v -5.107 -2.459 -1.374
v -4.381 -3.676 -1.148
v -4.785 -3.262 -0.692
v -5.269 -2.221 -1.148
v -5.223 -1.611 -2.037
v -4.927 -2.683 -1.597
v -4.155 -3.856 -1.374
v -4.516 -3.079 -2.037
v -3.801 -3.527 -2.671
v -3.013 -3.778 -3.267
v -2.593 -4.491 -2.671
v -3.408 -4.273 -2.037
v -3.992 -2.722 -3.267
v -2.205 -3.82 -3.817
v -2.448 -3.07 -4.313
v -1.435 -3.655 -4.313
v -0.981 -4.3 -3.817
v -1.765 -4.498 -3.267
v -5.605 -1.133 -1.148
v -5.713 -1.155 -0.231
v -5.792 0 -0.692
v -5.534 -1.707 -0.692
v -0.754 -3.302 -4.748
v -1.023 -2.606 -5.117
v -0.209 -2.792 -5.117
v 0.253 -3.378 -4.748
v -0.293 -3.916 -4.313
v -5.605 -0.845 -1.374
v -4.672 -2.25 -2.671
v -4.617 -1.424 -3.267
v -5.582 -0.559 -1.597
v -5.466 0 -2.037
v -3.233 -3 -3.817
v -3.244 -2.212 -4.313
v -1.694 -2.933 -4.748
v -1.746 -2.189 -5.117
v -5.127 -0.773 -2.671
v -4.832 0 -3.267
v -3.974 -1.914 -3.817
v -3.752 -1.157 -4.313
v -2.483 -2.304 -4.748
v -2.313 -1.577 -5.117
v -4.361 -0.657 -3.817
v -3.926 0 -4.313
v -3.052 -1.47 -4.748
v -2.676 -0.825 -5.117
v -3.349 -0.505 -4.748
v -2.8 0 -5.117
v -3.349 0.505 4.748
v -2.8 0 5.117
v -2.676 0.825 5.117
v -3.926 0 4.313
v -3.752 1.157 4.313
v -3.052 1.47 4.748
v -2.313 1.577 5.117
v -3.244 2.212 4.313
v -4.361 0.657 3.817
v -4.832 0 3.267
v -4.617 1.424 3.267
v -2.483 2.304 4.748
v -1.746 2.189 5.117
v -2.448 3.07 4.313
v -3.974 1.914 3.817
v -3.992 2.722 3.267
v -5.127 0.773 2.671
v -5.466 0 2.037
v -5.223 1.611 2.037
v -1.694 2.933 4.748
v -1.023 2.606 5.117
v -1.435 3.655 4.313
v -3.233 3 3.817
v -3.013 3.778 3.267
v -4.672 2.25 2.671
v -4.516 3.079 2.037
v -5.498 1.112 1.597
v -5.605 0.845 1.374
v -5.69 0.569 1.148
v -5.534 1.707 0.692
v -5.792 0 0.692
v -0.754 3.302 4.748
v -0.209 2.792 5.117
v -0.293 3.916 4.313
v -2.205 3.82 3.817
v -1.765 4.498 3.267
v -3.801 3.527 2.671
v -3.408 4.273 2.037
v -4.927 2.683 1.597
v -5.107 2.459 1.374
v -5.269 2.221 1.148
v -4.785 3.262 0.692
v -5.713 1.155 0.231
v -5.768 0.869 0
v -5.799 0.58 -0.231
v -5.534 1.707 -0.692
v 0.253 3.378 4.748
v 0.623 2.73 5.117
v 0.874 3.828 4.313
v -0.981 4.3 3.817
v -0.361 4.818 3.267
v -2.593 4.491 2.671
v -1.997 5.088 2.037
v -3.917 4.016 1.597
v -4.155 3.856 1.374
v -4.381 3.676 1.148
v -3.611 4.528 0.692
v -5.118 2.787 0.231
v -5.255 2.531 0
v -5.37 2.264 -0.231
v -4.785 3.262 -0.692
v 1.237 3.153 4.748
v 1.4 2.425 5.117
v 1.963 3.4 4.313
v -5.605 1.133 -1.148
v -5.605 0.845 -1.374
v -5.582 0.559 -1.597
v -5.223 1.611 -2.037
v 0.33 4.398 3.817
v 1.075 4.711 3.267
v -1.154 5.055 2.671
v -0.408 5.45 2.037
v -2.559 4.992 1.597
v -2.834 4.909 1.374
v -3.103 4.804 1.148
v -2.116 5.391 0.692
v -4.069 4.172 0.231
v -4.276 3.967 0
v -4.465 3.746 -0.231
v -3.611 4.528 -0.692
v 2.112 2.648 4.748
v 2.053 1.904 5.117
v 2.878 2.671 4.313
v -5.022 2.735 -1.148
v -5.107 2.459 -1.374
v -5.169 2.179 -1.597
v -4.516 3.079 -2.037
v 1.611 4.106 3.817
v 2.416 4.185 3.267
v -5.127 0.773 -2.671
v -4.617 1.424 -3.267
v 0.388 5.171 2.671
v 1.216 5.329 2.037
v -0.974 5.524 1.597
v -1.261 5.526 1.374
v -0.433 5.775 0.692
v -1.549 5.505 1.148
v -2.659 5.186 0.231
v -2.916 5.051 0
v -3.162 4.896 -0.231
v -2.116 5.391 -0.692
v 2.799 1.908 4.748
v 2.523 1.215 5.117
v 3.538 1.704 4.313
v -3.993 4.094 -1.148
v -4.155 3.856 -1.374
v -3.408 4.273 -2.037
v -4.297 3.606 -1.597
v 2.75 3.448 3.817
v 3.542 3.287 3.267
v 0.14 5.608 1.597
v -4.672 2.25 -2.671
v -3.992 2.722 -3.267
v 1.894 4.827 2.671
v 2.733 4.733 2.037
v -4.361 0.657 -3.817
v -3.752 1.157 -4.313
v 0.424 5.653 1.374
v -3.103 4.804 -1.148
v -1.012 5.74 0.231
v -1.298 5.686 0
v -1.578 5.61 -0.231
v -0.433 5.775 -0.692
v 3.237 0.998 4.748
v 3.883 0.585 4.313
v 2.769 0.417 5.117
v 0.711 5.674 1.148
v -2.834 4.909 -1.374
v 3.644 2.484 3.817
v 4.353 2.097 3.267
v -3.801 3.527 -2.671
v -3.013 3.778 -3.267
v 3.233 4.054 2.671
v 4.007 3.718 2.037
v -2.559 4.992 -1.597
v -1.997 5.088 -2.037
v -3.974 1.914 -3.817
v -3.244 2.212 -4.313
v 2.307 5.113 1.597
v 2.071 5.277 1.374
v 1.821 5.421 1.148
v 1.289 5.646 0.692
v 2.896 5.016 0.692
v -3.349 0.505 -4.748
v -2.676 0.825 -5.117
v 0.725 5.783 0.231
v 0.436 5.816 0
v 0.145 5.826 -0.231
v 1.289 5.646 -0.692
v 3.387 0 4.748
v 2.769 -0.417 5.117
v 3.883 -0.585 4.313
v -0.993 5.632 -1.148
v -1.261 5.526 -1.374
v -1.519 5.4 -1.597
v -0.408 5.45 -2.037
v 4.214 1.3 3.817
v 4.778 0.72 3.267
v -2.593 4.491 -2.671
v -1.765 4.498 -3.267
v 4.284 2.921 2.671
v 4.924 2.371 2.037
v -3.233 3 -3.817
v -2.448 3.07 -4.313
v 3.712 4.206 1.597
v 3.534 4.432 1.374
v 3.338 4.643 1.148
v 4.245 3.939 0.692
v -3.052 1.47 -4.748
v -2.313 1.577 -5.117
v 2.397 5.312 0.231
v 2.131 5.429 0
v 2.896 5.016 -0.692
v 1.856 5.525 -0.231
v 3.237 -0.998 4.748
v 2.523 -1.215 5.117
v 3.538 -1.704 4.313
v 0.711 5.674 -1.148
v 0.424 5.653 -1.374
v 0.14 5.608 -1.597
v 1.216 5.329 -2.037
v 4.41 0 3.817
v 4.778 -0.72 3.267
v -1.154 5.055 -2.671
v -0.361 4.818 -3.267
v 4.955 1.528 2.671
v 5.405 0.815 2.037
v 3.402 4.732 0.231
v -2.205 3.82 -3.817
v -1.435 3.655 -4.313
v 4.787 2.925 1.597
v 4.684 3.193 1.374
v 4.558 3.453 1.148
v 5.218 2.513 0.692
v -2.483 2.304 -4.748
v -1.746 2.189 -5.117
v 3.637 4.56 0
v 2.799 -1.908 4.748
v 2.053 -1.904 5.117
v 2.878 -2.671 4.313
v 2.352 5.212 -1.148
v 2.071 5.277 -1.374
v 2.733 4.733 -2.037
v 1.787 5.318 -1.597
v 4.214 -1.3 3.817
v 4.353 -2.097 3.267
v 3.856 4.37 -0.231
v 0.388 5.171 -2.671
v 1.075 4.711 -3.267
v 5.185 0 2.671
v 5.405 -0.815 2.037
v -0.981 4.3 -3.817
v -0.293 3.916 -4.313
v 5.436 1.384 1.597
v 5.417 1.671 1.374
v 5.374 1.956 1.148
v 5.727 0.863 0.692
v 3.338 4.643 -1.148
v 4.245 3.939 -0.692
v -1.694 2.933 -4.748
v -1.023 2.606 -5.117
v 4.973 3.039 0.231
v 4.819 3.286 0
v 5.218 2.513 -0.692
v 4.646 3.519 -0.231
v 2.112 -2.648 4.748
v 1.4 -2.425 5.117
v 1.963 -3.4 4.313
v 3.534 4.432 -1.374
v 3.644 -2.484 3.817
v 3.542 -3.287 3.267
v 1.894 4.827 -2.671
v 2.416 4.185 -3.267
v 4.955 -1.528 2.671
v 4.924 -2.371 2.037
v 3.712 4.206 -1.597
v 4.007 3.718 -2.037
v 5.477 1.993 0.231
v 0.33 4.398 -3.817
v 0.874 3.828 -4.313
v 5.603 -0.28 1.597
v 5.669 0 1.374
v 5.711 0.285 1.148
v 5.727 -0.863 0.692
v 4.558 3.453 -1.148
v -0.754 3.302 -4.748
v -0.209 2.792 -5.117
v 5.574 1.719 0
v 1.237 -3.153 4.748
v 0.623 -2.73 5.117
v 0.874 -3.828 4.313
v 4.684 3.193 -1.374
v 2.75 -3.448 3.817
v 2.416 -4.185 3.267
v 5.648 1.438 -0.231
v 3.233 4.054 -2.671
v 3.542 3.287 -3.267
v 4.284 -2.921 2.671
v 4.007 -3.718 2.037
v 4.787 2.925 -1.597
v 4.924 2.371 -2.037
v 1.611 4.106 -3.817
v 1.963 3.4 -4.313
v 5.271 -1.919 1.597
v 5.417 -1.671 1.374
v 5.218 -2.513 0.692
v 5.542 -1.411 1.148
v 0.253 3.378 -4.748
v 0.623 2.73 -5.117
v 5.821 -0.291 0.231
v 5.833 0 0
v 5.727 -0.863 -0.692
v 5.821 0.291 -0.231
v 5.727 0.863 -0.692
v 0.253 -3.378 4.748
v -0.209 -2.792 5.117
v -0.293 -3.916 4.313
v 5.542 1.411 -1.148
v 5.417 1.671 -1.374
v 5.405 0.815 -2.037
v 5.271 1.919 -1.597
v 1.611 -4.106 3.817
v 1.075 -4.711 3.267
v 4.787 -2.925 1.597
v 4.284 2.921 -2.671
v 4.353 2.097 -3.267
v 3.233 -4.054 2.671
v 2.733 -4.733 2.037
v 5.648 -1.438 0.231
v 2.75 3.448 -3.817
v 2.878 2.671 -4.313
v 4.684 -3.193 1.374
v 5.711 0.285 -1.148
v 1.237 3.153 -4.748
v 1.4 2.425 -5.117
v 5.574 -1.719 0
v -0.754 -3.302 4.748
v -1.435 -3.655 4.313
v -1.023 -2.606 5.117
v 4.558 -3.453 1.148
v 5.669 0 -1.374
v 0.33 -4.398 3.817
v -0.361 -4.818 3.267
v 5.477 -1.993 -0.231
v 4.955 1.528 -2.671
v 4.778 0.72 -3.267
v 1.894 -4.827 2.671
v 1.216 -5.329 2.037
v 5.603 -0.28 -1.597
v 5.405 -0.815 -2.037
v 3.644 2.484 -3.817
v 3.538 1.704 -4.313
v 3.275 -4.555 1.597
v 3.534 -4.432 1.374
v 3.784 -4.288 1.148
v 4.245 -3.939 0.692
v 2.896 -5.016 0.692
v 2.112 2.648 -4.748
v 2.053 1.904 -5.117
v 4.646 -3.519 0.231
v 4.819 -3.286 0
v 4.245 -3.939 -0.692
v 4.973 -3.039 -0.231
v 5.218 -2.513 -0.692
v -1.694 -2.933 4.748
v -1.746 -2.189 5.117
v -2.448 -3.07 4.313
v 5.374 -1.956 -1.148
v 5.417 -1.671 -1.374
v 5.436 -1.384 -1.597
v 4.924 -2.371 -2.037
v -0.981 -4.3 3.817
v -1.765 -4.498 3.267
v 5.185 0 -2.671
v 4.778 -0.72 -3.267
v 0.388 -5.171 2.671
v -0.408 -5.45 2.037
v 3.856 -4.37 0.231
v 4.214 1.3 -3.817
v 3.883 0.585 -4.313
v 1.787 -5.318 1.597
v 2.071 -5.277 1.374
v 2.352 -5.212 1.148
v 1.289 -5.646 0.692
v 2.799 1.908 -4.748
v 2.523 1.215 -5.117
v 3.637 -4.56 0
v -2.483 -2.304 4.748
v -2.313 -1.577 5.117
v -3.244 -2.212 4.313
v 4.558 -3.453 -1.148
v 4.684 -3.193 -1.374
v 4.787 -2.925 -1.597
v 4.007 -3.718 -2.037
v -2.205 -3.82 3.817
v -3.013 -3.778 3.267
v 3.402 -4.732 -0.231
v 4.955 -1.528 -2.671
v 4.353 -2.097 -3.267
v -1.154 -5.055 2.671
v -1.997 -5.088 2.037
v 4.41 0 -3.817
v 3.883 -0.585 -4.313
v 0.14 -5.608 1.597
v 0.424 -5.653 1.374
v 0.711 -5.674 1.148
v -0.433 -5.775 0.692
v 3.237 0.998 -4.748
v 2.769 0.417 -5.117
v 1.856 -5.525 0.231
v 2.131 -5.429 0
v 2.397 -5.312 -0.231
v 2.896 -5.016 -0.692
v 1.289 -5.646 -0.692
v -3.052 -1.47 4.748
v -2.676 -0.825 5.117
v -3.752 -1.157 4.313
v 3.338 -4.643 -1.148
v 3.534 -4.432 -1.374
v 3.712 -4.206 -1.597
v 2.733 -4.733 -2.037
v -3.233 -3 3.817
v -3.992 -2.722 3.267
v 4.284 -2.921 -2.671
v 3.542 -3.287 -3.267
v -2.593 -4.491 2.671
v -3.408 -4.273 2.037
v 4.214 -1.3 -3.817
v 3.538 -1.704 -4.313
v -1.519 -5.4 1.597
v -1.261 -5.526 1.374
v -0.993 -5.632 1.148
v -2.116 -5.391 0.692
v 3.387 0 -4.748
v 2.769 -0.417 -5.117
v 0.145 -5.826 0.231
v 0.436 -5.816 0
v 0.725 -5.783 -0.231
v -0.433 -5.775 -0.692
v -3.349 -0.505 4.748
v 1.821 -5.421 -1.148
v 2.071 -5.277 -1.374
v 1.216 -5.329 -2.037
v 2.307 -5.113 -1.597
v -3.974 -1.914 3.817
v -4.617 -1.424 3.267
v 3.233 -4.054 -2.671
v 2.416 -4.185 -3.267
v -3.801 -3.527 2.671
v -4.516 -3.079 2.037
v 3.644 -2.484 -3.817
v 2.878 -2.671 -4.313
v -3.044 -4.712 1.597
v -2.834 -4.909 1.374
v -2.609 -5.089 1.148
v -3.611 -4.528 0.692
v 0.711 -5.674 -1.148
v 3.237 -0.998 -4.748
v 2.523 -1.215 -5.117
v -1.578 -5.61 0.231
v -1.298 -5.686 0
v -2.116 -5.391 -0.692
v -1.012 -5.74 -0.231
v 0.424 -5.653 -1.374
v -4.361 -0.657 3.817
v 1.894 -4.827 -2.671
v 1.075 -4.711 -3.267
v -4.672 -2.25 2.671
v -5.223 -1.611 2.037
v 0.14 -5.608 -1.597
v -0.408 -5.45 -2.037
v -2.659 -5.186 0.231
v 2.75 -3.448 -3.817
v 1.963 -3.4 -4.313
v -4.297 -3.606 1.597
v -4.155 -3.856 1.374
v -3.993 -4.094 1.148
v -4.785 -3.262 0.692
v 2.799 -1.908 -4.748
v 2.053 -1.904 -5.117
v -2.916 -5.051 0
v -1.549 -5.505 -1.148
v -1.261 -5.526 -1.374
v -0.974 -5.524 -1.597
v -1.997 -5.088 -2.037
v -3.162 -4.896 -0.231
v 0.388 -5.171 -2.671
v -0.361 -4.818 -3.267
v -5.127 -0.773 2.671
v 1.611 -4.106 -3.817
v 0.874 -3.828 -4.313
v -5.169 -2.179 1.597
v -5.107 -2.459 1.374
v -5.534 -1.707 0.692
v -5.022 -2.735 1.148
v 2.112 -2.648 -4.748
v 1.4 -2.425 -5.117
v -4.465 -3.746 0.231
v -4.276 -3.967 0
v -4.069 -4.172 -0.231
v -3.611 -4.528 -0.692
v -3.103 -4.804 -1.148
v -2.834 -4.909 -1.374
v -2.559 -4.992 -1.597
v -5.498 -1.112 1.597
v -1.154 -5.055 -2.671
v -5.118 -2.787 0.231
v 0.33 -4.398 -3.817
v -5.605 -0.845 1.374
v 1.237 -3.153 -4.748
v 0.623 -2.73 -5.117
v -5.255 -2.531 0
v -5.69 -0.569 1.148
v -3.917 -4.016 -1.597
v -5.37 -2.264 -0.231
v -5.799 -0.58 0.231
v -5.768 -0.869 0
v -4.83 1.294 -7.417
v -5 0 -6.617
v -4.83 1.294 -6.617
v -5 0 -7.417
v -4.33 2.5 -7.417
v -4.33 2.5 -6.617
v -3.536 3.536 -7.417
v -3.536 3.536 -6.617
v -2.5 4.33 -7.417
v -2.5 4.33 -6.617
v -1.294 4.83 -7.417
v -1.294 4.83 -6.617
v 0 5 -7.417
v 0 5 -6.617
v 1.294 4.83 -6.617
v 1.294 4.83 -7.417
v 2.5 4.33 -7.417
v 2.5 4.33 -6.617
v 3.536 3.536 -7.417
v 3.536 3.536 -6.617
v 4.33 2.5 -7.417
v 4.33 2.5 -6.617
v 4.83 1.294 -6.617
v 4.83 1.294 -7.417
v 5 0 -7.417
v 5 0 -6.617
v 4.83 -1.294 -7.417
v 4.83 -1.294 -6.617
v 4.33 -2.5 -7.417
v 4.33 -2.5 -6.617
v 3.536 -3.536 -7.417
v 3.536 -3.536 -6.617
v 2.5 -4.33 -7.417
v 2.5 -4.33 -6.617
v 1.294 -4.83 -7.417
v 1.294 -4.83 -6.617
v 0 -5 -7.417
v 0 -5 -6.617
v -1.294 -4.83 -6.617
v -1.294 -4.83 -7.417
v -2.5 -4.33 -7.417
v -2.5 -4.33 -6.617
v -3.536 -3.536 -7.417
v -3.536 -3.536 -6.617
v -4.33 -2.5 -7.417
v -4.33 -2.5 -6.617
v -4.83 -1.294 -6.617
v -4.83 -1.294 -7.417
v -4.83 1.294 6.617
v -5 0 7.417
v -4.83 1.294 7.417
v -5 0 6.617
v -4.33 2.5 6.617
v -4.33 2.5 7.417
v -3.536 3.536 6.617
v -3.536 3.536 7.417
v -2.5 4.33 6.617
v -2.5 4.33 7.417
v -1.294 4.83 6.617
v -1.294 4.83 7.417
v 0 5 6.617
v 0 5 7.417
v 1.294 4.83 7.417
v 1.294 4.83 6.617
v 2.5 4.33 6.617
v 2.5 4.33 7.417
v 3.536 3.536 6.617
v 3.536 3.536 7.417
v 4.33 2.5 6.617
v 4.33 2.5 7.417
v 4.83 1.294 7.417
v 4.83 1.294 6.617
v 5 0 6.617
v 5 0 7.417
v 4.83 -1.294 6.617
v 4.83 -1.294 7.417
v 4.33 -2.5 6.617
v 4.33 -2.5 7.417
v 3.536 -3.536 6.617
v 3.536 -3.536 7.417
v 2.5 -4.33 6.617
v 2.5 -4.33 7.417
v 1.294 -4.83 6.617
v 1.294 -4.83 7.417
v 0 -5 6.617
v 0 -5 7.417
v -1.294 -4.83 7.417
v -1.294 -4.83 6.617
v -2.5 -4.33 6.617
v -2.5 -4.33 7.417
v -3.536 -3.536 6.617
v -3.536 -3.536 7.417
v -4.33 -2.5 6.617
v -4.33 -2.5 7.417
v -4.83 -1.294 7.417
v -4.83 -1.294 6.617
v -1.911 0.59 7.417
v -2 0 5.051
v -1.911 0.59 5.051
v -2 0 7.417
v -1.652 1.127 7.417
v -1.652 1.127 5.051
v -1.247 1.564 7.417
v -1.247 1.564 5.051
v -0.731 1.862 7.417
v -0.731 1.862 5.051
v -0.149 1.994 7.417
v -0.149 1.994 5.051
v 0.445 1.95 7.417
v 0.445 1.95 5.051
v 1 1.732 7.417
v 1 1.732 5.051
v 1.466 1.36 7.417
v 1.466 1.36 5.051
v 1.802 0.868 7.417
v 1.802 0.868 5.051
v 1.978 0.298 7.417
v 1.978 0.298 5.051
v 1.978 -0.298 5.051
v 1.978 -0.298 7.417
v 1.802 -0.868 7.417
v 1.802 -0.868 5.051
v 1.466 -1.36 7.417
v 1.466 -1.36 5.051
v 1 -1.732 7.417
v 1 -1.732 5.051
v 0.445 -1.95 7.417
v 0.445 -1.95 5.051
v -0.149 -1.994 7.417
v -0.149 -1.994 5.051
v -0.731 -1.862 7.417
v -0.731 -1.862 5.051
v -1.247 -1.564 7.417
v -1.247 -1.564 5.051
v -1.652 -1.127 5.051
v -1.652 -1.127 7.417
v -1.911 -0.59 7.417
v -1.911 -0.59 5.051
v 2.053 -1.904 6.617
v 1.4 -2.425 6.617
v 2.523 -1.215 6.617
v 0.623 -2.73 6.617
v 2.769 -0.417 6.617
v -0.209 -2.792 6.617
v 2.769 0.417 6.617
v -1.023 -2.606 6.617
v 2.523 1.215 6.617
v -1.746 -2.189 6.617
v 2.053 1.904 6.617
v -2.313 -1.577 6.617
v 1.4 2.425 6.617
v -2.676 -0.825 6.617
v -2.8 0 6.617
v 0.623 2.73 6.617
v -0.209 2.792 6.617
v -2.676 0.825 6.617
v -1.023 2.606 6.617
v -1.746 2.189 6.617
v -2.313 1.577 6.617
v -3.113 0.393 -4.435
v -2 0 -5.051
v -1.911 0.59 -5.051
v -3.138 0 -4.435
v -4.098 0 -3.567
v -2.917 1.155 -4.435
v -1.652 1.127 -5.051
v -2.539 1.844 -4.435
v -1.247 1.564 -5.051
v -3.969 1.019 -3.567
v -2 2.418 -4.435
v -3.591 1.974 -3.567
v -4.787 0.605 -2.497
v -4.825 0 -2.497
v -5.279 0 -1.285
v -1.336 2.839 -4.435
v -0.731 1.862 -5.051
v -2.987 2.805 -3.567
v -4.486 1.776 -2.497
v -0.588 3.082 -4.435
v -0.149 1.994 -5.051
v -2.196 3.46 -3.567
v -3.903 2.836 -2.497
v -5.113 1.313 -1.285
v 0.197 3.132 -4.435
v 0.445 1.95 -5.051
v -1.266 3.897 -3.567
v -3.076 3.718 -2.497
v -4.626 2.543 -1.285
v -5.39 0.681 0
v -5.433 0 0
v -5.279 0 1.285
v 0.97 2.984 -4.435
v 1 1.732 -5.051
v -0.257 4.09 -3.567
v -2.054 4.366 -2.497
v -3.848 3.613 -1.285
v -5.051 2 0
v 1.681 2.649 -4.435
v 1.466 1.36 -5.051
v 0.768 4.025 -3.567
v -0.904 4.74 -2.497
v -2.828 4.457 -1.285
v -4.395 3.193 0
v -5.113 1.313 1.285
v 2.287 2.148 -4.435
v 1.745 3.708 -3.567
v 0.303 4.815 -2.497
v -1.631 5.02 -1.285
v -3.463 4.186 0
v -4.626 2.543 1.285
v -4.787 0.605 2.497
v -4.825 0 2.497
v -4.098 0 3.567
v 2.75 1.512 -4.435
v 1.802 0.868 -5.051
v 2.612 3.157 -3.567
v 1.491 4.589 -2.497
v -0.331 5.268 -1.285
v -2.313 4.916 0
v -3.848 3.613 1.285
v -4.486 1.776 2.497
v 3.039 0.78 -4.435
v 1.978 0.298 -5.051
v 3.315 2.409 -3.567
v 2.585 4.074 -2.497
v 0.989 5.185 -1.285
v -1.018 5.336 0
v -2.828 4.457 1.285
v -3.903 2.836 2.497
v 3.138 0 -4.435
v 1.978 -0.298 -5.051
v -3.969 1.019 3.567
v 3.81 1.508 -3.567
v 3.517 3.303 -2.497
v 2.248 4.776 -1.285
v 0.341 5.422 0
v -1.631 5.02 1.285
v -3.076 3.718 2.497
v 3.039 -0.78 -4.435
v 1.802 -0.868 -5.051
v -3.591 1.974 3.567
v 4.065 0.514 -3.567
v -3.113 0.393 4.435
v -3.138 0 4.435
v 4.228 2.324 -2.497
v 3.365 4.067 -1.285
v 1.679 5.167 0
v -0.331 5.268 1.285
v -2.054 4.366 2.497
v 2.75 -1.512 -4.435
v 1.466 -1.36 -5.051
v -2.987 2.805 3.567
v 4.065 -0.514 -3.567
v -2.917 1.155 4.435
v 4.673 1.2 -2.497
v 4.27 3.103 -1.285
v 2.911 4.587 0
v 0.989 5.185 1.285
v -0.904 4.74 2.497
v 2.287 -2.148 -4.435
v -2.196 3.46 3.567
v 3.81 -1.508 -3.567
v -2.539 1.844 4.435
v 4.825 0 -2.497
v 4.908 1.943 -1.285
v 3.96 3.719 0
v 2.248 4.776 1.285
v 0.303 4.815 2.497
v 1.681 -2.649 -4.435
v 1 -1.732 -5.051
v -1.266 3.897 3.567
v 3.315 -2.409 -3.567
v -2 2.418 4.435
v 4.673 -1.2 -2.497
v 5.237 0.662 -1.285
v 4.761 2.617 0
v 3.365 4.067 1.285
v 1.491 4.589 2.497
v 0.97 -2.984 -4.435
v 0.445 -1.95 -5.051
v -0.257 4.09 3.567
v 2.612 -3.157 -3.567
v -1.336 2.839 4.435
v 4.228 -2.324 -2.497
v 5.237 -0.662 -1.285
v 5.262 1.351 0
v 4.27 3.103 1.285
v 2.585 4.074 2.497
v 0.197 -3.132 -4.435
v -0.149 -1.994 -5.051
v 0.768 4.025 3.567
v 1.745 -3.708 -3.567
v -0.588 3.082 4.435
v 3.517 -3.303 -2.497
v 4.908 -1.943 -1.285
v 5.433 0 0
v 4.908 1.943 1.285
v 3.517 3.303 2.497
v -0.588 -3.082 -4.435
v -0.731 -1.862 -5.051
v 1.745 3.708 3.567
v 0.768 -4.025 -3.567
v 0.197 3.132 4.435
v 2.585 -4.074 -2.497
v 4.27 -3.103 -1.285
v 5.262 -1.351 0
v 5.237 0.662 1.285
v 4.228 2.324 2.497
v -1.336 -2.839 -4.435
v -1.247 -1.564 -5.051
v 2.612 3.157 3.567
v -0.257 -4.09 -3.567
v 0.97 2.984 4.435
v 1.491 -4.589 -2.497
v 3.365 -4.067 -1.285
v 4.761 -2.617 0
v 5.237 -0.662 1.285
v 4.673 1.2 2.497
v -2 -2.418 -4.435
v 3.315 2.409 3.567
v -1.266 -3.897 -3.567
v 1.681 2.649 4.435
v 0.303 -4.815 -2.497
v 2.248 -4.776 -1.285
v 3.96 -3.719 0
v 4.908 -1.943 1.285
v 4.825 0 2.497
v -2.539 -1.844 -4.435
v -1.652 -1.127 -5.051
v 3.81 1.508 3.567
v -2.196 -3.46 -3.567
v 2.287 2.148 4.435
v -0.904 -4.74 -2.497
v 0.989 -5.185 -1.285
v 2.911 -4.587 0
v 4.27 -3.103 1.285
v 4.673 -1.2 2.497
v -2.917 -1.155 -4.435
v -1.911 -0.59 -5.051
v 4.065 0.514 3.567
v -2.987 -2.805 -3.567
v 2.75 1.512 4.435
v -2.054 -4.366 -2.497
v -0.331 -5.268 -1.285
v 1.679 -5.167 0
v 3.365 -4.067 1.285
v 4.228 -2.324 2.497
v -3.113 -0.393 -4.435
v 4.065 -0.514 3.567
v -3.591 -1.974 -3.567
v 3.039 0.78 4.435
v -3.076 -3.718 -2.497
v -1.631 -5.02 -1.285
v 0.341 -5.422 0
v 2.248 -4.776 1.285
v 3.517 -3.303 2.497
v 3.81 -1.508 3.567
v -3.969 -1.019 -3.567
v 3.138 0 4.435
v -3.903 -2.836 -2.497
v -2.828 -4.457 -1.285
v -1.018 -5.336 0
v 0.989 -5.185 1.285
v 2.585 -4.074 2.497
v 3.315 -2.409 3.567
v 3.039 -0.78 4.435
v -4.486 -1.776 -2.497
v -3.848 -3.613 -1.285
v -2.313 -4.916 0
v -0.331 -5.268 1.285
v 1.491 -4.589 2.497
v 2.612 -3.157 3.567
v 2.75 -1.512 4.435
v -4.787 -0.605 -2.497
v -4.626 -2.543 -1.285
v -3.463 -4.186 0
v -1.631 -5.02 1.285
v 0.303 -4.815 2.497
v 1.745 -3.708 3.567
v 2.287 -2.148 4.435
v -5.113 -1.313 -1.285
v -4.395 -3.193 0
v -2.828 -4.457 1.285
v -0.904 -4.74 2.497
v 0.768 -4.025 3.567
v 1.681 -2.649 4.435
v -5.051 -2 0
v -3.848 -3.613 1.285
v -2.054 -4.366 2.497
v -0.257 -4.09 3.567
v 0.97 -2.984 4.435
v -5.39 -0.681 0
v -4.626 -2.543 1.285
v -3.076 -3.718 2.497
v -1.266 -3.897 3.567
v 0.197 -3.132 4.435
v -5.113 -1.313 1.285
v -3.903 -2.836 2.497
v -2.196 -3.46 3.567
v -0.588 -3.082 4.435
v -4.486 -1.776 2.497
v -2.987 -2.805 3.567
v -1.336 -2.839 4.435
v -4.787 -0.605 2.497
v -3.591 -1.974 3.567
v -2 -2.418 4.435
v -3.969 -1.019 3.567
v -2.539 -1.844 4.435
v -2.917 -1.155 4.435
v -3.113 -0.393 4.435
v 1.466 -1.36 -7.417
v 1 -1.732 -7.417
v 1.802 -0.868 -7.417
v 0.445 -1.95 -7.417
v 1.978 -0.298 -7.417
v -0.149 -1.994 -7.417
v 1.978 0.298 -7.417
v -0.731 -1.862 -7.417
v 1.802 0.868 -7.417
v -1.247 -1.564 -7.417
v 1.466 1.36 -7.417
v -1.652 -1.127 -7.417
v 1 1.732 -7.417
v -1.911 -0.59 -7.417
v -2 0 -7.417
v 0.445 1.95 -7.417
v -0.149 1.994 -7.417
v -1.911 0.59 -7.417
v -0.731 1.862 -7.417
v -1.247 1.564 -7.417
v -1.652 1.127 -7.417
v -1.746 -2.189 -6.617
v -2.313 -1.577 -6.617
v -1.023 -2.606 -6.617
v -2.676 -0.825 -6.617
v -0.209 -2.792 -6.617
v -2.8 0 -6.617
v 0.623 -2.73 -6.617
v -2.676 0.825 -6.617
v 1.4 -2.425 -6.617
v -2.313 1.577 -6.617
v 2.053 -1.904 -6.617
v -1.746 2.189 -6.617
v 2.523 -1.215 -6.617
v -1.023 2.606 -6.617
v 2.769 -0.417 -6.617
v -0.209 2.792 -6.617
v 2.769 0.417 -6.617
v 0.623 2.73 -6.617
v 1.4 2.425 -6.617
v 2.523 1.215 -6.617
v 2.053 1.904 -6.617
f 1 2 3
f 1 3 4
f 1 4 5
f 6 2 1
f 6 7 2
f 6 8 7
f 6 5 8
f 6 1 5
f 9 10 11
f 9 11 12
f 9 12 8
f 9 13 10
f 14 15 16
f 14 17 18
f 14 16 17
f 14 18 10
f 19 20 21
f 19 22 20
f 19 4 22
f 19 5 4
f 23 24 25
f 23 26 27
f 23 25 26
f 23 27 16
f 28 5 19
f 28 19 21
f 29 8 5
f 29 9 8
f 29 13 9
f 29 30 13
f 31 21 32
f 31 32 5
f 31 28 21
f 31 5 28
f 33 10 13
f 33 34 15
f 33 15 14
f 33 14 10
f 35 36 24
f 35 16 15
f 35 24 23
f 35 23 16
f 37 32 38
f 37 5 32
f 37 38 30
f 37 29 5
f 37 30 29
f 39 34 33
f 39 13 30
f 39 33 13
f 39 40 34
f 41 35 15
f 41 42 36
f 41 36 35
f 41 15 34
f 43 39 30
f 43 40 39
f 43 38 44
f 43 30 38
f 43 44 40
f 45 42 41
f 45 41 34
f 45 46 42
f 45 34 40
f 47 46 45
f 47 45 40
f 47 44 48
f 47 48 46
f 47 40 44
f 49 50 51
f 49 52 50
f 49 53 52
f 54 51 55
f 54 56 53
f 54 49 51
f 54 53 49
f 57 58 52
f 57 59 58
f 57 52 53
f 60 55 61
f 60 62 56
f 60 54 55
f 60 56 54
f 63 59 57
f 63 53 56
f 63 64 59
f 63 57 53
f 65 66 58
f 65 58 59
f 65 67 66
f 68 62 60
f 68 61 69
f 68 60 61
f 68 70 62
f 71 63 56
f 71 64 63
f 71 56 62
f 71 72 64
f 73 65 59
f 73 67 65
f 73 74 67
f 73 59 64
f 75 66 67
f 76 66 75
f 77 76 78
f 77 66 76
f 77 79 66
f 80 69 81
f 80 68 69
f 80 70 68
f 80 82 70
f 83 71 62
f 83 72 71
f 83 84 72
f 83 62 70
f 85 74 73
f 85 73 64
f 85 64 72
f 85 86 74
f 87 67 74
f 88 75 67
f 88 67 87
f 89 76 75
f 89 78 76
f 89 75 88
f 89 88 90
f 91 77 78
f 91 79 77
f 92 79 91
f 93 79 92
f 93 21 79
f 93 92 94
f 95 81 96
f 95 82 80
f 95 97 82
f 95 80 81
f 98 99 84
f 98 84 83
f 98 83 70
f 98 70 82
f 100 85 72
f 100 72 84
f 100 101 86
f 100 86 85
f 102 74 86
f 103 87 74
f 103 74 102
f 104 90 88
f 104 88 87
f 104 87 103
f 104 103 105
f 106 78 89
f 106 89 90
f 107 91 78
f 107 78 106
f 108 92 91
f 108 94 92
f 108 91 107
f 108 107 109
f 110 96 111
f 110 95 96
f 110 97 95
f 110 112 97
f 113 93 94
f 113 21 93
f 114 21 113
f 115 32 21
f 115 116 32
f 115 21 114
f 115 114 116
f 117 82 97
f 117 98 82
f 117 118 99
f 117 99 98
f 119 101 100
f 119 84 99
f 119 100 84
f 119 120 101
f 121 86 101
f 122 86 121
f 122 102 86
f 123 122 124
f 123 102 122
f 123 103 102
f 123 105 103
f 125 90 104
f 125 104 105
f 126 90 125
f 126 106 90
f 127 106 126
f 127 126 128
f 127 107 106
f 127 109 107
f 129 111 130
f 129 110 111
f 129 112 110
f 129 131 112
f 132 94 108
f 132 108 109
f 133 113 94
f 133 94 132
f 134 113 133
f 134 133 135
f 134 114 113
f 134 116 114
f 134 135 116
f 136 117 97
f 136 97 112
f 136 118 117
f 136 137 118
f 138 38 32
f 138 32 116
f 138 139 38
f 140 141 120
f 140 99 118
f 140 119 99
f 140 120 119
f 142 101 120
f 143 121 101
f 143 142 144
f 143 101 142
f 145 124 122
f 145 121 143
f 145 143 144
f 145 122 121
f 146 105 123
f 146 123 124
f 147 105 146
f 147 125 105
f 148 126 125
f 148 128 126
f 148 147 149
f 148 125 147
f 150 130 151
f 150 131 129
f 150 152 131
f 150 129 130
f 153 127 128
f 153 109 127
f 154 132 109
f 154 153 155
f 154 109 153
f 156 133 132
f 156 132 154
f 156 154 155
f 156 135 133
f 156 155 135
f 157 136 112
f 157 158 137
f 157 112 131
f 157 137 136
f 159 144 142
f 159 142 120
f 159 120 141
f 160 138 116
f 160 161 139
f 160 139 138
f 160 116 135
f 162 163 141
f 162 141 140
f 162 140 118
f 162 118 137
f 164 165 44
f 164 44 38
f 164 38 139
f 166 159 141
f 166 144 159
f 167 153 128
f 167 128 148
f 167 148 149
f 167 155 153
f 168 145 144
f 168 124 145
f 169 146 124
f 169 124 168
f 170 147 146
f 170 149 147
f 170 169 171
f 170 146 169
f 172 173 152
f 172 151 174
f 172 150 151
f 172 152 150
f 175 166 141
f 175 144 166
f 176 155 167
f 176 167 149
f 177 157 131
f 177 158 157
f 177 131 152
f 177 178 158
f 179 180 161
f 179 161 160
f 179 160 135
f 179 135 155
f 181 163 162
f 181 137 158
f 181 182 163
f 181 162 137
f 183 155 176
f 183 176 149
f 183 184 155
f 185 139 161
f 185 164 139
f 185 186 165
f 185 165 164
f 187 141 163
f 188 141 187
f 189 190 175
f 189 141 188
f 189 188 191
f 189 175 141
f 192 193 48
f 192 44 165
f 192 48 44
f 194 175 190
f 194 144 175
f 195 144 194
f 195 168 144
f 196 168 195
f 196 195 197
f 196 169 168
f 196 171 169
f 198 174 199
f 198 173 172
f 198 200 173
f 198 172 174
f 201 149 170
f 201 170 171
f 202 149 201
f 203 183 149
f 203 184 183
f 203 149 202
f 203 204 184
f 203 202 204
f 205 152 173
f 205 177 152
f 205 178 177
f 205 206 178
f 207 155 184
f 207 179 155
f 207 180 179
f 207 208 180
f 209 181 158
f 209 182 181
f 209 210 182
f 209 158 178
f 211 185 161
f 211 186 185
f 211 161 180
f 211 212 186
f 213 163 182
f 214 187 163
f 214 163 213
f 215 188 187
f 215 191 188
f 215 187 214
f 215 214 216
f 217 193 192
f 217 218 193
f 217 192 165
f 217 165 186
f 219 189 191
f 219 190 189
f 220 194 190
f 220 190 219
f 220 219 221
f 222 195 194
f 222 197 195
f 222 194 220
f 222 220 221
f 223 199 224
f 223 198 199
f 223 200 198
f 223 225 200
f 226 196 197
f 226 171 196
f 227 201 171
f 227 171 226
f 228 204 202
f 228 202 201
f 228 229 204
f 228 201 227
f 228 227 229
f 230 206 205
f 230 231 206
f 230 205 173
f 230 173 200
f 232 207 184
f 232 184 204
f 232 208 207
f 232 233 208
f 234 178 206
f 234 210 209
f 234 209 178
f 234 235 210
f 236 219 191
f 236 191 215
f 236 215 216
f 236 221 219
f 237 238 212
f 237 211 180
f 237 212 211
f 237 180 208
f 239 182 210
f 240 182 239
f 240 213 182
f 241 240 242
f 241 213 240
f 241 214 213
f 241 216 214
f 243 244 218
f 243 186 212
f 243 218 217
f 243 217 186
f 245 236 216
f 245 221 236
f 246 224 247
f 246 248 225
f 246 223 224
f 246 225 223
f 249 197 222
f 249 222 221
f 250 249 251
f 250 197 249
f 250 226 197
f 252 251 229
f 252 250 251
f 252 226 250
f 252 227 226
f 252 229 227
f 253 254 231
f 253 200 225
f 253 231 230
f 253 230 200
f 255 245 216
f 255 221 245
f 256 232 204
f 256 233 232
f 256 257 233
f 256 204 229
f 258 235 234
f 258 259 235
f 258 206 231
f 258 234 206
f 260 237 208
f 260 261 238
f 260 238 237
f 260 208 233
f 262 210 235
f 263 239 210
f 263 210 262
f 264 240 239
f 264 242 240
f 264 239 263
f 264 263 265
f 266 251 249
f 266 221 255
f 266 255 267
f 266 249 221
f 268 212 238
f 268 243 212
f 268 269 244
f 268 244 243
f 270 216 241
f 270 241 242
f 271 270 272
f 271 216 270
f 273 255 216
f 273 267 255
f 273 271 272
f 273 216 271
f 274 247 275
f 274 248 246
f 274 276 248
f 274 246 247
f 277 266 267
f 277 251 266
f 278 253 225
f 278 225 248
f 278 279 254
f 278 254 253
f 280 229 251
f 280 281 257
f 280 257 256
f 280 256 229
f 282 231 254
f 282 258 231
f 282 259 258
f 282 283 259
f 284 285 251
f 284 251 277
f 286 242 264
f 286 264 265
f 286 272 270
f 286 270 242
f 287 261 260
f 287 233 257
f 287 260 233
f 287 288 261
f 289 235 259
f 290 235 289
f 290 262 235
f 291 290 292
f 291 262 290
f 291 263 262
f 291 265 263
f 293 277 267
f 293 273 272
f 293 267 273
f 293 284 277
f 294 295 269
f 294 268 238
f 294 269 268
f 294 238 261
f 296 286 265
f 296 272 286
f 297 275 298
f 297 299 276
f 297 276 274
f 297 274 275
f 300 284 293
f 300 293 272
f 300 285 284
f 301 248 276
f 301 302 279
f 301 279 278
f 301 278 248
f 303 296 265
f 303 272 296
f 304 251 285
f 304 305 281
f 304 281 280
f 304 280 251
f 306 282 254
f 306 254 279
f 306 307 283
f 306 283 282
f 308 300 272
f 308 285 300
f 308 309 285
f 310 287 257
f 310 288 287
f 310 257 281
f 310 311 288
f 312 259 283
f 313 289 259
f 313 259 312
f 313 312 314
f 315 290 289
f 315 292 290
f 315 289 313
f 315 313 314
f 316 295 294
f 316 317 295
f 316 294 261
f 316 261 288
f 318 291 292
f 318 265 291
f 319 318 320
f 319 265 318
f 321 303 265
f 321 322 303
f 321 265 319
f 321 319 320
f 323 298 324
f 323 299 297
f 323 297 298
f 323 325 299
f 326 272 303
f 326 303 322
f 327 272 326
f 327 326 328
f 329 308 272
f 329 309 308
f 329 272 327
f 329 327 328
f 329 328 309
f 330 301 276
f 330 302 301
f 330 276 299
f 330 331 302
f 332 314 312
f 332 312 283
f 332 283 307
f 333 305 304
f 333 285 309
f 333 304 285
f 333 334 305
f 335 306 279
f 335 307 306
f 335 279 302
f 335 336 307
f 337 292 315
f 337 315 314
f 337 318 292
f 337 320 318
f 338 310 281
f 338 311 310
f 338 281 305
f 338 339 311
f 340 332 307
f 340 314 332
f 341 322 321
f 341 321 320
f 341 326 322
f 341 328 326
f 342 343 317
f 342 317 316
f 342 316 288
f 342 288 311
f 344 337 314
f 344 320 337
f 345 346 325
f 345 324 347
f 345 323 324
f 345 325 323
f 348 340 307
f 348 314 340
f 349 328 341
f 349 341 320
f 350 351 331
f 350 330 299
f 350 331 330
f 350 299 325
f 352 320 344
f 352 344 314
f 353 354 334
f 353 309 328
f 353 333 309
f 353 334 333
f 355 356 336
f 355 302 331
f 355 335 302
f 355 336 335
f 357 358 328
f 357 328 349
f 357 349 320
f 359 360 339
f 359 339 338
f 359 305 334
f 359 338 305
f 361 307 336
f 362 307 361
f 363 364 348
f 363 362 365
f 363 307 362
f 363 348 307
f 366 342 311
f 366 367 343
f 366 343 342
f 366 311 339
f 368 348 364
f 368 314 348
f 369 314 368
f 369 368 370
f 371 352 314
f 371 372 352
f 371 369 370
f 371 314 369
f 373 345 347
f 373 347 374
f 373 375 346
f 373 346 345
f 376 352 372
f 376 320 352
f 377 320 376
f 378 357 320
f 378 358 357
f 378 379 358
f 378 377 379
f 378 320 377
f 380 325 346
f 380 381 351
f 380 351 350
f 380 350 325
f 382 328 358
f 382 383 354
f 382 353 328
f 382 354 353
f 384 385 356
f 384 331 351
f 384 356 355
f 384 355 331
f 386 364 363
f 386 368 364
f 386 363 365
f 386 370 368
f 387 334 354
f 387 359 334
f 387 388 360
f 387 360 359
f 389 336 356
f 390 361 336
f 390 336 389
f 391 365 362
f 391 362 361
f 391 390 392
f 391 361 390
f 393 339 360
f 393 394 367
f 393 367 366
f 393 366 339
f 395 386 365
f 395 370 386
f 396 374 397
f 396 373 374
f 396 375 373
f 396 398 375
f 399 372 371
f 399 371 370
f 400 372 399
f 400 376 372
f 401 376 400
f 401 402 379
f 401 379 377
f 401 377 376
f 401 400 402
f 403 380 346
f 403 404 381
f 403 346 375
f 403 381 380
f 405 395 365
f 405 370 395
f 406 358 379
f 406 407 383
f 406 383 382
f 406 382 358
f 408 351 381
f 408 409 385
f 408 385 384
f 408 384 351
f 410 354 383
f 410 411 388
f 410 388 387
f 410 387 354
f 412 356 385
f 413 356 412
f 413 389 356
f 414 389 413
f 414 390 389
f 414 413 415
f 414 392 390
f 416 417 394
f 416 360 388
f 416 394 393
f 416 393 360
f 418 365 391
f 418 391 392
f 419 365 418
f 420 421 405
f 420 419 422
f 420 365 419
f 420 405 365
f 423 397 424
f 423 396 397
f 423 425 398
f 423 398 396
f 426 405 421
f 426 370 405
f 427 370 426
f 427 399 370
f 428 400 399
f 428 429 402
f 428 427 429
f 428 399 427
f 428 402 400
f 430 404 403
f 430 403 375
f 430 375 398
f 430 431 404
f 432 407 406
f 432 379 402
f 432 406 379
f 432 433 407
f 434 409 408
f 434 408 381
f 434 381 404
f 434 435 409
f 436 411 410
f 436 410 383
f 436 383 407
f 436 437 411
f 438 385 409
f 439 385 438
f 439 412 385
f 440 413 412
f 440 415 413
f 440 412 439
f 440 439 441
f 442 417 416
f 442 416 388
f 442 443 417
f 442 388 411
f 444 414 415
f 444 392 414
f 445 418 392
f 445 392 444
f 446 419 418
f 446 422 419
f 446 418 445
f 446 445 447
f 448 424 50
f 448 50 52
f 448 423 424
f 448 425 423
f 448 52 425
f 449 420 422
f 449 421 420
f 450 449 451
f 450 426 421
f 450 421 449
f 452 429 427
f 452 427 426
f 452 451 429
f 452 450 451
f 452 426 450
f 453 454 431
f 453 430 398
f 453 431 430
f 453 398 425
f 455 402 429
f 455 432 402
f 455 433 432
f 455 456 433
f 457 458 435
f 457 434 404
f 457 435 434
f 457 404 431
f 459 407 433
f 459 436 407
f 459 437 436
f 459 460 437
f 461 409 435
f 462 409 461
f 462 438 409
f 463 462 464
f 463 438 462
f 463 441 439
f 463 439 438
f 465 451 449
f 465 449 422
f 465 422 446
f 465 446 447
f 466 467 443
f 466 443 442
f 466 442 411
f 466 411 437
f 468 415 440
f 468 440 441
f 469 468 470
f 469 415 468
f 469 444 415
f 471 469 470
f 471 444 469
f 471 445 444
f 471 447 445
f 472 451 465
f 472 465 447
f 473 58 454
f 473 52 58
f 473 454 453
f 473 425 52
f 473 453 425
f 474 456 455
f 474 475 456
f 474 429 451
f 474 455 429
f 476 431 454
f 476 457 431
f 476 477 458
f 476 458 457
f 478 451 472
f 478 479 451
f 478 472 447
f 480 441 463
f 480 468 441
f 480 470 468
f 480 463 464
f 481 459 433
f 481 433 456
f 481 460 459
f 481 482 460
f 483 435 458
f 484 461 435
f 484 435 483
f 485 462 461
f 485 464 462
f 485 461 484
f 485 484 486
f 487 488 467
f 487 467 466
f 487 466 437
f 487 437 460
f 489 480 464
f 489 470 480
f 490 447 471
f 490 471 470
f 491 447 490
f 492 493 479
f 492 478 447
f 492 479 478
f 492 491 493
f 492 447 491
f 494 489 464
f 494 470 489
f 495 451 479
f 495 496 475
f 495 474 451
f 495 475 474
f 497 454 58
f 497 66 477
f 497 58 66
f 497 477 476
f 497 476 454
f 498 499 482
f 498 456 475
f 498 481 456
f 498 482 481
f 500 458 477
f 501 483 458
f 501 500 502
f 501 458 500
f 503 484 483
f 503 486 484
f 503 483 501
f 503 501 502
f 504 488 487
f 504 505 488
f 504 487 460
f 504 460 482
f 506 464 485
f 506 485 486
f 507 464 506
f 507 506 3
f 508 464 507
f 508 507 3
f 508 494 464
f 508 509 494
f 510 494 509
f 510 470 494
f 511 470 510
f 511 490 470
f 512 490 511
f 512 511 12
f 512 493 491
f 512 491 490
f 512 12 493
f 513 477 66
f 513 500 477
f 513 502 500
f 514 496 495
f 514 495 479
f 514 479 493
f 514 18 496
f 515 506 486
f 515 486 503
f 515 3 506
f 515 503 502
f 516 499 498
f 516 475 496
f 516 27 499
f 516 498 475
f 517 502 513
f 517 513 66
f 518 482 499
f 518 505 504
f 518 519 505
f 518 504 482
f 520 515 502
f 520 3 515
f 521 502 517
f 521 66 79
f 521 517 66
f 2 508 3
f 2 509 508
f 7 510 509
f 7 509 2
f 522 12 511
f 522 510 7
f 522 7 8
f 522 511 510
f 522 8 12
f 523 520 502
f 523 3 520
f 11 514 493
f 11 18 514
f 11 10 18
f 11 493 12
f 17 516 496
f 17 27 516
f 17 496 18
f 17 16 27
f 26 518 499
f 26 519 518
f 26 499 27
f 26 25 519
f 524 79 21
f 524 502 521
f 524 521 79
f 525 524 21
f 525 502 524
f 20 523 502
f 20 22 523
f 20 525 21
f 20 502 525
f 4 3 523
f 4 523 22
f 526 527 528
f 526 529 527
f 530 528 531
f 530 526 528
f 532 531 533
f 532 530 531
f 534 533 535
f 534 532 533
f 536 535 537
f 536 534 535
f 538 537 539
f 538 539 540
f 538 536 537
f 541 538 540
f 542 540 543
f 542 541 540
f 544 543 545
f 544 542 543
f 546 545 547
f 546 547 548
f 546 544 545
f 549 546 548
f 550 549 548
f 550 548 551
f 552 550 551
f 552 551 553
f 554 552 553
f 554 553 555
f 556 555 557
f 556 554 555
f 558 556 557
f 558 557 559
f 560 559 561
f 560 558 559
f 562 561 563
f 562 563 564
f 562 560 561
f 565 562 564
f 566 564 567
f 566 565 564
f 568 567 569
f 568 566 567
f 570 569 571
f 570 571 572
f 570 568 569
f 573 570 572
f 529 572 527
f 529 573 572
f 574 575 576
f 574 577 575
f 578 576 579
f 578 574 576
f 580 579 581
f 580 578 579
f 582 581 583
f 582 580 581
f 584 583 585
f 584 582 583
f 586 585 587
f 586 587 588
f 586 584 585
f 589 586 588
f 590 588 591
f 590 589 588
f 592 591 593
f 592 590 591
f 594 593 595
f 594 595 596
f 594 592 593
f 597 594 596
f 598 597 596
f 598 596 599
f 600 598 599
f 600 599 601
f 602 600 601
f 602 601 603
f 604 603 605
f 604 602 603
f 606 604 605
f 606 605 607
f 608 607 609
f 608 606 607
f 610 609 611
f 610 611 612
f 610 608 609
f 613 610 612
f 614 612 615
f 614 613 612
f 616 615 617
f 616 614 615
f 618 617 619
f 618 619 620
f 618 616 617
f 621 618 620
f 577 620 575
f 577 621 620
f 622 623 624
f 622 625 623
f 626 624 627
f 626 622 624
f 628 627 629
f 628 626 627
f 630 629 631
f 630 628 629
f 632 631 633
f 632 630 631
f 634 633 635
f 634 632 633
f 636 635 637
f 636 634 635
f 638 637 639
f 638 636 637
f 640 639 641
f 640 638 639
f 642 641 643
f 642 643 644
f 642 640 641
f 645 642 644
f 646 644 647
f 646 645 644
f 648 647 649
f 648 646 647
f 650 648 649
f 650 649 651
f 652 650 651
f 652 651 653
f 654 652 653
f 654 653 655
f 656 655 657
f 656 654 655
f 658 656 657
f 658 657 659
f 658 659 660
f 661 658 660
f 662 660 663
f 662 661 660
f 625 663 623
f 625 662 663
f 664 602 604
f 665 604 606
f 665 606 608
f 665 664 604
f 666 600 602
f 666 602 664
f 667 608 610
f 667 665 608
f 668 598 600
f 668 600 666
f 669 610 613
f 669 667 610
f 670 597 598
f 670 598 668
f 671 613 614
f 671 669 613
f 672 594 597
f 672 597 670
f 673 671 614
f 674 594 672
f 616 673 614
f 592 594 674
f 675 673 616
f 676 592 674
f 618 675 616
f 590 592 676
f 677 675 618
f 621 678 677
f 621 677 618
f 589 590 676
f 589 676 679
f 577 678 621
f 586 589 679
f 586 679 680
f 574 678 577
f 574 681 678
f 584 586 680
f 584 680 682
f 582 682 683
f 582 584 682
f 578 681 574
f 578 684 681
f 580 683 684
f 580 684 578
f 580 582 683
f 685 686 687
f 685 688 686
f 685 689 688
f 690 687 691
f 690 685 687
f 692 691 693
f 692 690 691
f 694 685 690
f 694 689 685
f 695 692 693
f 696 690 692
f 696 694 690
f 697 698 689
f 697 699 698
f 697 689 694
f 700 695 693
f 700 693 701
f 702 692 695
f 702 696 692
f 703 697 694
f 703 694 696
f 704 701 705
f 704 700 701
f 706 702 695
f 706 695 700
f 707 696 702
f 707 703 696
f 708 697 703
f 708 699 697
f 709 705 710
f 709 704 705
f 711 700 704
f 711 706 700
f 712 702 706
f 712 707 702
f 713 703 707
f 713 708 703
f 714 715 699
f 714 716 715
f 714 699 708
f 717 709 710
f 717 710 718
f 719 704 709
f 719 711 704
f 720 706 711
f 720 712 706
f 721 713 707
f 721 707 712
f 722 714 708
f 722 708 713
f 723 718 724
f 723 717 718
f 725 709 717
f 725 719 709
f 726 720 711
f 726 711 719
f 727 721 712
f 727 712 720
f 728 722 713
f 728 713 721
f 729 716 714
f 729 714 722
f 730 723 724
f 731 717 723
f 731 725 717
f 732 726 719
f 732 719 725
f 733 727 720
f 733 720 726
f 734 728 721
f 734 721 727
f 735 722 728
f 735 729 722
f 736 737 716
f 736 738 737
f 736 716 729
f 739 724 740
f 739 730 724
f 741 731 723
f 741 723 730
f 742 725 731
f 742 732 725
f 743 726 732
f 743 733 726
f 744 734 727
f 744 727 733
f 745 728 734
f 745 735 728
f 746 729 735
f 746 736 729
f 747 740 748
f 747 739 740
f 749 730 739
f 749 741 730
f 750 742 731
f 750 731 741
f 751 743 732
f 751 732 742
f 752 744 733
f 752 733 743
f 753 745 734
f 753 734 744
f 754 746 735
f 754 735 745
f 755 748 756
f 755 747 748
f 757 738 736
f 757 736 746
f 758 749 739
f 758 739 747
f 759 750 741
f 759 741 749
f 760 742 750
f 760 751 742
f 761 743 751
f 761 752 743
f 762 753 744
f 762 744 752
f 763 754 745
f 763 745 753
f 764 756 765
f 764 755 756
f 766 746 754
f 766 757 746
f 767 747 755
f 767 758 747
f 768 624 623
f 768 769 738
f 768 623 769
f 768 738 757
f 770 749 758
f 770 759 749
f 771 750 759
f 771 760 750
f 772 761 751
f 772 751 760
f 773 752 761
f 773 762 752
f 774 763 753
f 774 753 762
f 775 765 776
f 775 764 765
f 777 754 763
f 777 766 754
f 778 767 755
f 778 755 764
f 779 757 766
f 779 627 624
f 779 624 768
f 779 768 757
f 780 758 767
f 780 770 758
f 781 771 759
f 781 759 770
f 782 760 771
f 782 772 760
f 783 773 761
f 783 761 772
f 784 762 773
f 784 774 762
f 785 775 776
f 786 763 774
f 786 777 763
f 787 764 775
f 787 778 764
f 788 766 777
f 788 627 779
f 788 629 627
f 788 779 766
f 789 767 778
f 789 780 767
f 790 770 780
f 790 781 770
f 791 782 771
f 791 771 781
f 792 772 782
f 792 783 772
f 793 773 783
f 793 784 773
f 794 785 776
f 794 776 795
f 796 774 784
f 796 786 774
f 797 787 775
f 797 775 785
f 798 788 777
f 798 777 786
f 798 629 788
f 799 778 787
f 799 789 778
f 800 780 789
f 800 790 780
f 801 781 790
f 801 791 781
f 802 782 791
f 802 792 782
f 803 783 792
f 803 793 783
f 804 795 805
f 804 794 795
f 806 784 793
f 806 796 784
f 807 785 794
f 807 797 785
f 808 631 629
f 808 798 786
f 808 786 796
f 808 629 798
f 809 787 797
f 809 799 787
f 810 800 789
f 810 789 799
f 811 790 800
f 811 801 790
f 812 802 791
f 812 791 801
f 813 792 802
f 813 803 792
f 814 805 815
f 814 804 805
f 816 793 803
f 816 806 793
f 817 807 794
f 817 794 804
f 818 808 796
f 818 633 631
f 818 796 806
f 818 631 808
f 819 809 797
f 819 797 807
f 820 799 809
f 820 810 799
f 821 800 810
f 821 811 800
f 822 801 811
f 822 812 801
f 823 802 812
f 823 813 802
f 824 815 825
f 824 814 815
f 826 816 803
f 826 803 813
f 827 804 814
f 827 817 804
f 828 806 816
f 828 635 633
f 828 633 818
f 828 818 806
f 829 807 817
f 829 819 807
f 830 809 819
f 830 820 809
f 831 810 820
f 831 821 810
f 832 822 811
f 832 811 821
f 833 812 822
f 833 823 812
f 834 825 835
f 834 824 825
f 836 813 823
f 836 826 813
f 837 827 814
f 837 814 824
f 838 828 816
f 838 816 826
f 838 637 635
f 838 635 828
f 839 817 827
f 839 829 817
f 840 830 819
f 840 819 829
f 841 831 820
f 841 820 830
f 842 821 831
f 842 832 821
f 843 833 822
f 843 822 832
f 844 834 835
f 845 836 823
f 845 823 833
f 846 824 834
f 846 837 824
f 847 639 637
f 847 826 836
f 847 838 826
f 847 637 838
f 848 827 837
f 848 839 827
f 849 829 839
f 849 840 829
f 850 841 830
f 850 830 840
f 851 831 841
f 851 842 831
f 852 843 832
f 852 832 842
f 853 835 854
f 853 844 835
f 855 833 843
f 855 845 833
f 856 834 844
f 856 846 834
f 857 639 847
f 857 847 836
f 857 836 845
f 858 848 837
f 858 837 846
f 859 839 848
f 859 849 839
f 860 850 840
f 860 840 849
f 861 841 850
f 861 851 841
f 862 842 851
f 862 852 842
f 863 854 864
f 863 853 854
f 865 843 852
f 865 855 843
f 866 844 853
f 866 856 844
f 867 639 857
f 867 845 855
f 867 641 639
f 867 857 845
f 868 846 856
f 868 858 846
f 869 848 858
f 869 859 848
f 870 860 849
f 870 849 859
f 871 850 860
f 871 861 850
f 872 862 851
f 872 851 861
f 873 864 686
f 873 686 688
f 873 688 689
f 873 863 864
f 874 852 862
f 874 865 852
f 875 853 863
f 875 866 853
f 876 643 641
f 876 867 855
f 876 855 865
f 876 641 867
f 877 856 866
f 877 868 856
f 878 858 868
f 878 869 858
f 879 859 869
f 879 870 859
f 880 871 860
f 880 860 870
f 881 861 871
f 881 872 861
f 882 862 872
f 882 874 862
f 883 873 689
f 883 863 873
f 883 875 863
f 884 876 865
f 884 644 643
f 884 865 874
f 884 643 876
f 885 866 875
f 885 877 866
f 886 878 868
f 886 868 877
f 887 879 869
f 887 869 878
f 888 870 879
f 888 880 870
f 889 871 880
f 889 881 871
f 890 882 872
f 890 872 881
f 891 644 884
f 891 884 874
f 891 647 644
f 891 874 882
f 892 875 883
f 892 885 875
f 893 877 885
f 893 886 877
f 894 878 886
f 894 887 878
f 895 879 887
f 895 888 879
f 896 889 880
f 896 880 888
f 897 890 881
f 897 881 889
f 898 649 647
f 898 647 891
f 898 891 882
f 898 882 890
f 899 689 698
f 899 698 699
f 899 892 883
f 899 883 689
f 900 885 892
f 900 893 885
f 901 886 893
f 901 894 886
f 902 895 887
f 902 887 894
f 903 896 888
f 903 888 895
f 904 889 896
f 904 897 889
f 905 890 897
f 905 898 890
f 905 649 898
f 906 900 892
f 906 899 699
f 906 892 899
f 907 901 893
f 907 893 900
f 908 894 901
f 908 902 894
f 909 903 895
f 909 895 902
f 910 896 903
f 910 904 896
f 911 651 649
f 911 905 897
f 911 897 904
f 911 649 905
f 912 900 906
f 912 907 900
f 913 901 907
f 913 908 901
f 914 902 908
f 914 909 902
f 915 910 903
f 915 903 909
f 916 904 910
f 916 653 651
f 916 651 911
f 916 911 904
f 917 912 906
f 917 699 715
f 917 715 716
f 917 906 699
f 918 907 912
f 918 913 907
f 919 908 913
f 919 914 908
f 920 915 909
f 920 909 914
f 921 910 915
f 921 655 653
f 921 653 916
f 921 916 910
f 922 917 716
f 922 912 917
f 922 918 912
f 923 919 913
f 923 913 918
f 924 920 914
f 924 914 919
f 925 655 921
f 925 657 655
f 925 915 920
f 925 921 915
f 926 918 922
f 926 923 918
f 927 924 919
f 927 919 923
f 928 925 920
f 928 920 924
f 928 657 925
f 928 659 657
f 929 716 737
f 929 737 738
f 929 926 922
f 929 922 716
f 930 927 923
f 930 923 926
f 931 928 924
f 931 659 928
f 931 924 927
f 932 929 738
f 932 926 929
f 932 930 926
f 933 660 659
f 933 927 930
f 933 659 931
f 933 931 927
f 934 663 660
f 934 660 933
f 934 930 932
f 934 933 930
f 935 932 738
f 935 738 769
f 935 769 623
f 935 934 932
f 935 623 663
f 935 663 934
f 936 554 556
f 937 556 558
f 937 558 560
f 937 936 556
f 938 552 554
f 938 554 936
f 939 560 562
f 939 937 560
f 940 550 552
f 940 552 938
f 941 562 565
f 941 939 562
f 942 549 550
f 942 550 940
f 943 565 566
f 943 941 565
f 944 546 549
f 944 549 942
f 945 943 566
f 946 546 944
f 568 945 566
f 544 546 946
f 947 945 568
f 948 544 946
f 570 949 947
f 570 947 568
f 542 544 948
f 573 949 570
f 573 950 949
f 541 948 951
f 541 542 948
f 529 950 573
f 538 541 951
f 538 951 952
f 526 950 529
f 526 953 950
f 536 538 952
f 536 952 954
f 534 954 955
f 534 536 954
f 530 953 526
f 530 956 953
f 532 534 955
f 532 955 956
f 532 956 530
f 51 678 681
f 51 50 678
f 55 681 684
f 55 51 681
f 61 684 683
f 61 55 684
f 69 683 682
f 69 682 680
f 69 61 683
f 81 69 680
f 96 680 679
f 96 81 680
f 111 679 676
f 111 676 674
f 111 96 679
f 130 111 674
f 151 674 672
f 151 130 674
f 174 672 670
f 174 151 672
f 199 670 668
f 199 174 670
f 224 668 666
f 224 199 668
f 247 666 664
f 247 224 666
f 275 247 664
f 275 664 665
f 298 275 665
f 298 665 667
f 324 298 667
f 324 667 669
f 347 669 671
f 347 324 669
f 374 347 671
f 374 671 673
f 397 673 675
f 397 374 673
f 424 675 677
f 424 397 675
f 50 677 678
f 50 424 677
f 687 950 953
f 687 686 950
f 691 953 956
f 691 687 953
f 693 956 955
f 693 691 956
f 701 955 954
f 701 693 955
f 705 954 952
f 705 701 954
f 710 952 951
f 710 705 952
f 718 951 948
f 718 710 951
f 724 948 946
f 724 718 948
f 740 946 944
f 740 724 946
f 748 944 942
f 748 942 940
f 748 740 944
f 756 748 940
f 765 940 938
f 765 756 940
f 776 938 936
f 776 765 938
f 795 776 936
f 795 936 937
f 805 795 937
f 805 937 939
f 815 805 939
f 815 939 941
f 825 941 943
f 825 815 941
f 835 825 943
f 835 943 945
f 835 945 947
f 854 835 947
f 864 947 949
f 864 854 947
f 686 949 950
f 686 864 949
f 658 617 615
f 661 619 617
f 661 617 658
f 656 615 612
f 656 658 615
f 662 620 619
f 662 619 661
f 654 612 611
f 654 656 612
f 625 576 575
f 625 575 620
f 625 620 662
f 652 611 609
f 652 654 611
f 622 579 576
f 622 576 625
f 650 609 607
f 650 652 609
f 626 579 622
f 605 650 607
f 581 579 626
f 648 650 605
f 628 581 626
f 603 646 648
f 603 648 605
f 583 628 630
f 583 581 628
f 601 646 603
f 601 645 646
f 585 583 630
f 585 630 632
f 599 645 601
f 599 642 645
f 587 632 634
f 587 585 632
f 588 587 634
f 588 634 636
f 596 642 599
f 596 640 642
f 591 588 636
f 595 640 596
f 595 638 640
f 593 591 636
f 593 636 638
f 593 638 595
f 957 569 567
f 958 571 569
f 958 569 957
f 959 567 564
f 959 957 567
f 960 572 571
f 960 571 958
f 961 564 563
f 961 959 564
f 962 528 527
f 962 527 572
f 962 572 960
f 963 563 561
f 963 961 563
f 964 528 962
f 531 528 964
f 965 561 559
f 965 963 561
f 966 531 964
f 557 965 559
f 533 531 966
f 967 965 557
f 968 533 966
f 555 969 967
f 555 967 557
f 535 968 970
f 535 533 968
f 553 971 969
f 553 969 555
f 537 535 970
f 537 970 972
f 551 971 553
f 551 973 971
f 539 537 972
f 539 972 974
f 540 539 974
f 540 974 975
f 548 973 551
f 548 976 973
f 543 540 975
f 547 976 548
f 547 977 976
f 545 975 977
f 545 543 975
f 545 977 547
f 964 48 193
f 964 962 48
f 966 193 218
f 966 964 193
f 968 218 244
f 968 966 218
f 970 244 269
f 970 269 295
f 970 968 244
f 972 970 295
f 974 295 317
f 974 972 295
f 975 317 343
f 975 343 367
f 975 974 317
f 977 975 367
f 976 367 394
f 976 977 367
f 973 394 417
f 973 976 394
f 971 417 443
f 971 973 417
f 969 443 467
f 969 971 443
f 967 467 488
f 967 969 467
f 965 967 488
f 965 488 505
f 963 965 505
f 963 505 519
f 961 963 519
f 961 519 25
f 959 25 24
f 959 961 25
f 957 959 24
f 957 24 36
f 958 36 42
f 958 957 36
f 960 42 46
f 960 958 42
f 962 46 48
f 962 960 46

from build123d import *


with BuildPart() as f1:
    # F0 (on Front) → F1 (revolve)
    with BuildSketch(Plane.XZ):
        with BuildLine():
            Line((-2.8, 6.616661), (-2.8, 5.116661))
            ThreePointArc((-2.8, 5.116661), (-5.832685, 0), (-2.8, -5.116661))
            Line((-2.8, -5.116661), (-2.8, -6.616661))
            Line((-2.8, -6.616661), (-5, -6.616661))
            Line((-5, -6.616661), (-5, -7.416661))
            Line((-5, -7.416661), (-2, -7.416661))
            Line((-2, -7.416661), (-2, -5.051145))
            ThreePointArc((-2, -5.051145), (-5.432685, 0), (-2, 5.051145))
            Line((-2, 5.051145), (-2, 7.416661))
            Line((-2, 7.416661), (-5, 7.416661))
            Line((-5, 7.416661), (-5, 6.616661))
            Line((-5, 6.616661), (-2.8, 6.616661))
        make_face()
    revolve(axis=Axis((0, 0, -0.442801), (0, 0, -1)))


solid = f1.part
